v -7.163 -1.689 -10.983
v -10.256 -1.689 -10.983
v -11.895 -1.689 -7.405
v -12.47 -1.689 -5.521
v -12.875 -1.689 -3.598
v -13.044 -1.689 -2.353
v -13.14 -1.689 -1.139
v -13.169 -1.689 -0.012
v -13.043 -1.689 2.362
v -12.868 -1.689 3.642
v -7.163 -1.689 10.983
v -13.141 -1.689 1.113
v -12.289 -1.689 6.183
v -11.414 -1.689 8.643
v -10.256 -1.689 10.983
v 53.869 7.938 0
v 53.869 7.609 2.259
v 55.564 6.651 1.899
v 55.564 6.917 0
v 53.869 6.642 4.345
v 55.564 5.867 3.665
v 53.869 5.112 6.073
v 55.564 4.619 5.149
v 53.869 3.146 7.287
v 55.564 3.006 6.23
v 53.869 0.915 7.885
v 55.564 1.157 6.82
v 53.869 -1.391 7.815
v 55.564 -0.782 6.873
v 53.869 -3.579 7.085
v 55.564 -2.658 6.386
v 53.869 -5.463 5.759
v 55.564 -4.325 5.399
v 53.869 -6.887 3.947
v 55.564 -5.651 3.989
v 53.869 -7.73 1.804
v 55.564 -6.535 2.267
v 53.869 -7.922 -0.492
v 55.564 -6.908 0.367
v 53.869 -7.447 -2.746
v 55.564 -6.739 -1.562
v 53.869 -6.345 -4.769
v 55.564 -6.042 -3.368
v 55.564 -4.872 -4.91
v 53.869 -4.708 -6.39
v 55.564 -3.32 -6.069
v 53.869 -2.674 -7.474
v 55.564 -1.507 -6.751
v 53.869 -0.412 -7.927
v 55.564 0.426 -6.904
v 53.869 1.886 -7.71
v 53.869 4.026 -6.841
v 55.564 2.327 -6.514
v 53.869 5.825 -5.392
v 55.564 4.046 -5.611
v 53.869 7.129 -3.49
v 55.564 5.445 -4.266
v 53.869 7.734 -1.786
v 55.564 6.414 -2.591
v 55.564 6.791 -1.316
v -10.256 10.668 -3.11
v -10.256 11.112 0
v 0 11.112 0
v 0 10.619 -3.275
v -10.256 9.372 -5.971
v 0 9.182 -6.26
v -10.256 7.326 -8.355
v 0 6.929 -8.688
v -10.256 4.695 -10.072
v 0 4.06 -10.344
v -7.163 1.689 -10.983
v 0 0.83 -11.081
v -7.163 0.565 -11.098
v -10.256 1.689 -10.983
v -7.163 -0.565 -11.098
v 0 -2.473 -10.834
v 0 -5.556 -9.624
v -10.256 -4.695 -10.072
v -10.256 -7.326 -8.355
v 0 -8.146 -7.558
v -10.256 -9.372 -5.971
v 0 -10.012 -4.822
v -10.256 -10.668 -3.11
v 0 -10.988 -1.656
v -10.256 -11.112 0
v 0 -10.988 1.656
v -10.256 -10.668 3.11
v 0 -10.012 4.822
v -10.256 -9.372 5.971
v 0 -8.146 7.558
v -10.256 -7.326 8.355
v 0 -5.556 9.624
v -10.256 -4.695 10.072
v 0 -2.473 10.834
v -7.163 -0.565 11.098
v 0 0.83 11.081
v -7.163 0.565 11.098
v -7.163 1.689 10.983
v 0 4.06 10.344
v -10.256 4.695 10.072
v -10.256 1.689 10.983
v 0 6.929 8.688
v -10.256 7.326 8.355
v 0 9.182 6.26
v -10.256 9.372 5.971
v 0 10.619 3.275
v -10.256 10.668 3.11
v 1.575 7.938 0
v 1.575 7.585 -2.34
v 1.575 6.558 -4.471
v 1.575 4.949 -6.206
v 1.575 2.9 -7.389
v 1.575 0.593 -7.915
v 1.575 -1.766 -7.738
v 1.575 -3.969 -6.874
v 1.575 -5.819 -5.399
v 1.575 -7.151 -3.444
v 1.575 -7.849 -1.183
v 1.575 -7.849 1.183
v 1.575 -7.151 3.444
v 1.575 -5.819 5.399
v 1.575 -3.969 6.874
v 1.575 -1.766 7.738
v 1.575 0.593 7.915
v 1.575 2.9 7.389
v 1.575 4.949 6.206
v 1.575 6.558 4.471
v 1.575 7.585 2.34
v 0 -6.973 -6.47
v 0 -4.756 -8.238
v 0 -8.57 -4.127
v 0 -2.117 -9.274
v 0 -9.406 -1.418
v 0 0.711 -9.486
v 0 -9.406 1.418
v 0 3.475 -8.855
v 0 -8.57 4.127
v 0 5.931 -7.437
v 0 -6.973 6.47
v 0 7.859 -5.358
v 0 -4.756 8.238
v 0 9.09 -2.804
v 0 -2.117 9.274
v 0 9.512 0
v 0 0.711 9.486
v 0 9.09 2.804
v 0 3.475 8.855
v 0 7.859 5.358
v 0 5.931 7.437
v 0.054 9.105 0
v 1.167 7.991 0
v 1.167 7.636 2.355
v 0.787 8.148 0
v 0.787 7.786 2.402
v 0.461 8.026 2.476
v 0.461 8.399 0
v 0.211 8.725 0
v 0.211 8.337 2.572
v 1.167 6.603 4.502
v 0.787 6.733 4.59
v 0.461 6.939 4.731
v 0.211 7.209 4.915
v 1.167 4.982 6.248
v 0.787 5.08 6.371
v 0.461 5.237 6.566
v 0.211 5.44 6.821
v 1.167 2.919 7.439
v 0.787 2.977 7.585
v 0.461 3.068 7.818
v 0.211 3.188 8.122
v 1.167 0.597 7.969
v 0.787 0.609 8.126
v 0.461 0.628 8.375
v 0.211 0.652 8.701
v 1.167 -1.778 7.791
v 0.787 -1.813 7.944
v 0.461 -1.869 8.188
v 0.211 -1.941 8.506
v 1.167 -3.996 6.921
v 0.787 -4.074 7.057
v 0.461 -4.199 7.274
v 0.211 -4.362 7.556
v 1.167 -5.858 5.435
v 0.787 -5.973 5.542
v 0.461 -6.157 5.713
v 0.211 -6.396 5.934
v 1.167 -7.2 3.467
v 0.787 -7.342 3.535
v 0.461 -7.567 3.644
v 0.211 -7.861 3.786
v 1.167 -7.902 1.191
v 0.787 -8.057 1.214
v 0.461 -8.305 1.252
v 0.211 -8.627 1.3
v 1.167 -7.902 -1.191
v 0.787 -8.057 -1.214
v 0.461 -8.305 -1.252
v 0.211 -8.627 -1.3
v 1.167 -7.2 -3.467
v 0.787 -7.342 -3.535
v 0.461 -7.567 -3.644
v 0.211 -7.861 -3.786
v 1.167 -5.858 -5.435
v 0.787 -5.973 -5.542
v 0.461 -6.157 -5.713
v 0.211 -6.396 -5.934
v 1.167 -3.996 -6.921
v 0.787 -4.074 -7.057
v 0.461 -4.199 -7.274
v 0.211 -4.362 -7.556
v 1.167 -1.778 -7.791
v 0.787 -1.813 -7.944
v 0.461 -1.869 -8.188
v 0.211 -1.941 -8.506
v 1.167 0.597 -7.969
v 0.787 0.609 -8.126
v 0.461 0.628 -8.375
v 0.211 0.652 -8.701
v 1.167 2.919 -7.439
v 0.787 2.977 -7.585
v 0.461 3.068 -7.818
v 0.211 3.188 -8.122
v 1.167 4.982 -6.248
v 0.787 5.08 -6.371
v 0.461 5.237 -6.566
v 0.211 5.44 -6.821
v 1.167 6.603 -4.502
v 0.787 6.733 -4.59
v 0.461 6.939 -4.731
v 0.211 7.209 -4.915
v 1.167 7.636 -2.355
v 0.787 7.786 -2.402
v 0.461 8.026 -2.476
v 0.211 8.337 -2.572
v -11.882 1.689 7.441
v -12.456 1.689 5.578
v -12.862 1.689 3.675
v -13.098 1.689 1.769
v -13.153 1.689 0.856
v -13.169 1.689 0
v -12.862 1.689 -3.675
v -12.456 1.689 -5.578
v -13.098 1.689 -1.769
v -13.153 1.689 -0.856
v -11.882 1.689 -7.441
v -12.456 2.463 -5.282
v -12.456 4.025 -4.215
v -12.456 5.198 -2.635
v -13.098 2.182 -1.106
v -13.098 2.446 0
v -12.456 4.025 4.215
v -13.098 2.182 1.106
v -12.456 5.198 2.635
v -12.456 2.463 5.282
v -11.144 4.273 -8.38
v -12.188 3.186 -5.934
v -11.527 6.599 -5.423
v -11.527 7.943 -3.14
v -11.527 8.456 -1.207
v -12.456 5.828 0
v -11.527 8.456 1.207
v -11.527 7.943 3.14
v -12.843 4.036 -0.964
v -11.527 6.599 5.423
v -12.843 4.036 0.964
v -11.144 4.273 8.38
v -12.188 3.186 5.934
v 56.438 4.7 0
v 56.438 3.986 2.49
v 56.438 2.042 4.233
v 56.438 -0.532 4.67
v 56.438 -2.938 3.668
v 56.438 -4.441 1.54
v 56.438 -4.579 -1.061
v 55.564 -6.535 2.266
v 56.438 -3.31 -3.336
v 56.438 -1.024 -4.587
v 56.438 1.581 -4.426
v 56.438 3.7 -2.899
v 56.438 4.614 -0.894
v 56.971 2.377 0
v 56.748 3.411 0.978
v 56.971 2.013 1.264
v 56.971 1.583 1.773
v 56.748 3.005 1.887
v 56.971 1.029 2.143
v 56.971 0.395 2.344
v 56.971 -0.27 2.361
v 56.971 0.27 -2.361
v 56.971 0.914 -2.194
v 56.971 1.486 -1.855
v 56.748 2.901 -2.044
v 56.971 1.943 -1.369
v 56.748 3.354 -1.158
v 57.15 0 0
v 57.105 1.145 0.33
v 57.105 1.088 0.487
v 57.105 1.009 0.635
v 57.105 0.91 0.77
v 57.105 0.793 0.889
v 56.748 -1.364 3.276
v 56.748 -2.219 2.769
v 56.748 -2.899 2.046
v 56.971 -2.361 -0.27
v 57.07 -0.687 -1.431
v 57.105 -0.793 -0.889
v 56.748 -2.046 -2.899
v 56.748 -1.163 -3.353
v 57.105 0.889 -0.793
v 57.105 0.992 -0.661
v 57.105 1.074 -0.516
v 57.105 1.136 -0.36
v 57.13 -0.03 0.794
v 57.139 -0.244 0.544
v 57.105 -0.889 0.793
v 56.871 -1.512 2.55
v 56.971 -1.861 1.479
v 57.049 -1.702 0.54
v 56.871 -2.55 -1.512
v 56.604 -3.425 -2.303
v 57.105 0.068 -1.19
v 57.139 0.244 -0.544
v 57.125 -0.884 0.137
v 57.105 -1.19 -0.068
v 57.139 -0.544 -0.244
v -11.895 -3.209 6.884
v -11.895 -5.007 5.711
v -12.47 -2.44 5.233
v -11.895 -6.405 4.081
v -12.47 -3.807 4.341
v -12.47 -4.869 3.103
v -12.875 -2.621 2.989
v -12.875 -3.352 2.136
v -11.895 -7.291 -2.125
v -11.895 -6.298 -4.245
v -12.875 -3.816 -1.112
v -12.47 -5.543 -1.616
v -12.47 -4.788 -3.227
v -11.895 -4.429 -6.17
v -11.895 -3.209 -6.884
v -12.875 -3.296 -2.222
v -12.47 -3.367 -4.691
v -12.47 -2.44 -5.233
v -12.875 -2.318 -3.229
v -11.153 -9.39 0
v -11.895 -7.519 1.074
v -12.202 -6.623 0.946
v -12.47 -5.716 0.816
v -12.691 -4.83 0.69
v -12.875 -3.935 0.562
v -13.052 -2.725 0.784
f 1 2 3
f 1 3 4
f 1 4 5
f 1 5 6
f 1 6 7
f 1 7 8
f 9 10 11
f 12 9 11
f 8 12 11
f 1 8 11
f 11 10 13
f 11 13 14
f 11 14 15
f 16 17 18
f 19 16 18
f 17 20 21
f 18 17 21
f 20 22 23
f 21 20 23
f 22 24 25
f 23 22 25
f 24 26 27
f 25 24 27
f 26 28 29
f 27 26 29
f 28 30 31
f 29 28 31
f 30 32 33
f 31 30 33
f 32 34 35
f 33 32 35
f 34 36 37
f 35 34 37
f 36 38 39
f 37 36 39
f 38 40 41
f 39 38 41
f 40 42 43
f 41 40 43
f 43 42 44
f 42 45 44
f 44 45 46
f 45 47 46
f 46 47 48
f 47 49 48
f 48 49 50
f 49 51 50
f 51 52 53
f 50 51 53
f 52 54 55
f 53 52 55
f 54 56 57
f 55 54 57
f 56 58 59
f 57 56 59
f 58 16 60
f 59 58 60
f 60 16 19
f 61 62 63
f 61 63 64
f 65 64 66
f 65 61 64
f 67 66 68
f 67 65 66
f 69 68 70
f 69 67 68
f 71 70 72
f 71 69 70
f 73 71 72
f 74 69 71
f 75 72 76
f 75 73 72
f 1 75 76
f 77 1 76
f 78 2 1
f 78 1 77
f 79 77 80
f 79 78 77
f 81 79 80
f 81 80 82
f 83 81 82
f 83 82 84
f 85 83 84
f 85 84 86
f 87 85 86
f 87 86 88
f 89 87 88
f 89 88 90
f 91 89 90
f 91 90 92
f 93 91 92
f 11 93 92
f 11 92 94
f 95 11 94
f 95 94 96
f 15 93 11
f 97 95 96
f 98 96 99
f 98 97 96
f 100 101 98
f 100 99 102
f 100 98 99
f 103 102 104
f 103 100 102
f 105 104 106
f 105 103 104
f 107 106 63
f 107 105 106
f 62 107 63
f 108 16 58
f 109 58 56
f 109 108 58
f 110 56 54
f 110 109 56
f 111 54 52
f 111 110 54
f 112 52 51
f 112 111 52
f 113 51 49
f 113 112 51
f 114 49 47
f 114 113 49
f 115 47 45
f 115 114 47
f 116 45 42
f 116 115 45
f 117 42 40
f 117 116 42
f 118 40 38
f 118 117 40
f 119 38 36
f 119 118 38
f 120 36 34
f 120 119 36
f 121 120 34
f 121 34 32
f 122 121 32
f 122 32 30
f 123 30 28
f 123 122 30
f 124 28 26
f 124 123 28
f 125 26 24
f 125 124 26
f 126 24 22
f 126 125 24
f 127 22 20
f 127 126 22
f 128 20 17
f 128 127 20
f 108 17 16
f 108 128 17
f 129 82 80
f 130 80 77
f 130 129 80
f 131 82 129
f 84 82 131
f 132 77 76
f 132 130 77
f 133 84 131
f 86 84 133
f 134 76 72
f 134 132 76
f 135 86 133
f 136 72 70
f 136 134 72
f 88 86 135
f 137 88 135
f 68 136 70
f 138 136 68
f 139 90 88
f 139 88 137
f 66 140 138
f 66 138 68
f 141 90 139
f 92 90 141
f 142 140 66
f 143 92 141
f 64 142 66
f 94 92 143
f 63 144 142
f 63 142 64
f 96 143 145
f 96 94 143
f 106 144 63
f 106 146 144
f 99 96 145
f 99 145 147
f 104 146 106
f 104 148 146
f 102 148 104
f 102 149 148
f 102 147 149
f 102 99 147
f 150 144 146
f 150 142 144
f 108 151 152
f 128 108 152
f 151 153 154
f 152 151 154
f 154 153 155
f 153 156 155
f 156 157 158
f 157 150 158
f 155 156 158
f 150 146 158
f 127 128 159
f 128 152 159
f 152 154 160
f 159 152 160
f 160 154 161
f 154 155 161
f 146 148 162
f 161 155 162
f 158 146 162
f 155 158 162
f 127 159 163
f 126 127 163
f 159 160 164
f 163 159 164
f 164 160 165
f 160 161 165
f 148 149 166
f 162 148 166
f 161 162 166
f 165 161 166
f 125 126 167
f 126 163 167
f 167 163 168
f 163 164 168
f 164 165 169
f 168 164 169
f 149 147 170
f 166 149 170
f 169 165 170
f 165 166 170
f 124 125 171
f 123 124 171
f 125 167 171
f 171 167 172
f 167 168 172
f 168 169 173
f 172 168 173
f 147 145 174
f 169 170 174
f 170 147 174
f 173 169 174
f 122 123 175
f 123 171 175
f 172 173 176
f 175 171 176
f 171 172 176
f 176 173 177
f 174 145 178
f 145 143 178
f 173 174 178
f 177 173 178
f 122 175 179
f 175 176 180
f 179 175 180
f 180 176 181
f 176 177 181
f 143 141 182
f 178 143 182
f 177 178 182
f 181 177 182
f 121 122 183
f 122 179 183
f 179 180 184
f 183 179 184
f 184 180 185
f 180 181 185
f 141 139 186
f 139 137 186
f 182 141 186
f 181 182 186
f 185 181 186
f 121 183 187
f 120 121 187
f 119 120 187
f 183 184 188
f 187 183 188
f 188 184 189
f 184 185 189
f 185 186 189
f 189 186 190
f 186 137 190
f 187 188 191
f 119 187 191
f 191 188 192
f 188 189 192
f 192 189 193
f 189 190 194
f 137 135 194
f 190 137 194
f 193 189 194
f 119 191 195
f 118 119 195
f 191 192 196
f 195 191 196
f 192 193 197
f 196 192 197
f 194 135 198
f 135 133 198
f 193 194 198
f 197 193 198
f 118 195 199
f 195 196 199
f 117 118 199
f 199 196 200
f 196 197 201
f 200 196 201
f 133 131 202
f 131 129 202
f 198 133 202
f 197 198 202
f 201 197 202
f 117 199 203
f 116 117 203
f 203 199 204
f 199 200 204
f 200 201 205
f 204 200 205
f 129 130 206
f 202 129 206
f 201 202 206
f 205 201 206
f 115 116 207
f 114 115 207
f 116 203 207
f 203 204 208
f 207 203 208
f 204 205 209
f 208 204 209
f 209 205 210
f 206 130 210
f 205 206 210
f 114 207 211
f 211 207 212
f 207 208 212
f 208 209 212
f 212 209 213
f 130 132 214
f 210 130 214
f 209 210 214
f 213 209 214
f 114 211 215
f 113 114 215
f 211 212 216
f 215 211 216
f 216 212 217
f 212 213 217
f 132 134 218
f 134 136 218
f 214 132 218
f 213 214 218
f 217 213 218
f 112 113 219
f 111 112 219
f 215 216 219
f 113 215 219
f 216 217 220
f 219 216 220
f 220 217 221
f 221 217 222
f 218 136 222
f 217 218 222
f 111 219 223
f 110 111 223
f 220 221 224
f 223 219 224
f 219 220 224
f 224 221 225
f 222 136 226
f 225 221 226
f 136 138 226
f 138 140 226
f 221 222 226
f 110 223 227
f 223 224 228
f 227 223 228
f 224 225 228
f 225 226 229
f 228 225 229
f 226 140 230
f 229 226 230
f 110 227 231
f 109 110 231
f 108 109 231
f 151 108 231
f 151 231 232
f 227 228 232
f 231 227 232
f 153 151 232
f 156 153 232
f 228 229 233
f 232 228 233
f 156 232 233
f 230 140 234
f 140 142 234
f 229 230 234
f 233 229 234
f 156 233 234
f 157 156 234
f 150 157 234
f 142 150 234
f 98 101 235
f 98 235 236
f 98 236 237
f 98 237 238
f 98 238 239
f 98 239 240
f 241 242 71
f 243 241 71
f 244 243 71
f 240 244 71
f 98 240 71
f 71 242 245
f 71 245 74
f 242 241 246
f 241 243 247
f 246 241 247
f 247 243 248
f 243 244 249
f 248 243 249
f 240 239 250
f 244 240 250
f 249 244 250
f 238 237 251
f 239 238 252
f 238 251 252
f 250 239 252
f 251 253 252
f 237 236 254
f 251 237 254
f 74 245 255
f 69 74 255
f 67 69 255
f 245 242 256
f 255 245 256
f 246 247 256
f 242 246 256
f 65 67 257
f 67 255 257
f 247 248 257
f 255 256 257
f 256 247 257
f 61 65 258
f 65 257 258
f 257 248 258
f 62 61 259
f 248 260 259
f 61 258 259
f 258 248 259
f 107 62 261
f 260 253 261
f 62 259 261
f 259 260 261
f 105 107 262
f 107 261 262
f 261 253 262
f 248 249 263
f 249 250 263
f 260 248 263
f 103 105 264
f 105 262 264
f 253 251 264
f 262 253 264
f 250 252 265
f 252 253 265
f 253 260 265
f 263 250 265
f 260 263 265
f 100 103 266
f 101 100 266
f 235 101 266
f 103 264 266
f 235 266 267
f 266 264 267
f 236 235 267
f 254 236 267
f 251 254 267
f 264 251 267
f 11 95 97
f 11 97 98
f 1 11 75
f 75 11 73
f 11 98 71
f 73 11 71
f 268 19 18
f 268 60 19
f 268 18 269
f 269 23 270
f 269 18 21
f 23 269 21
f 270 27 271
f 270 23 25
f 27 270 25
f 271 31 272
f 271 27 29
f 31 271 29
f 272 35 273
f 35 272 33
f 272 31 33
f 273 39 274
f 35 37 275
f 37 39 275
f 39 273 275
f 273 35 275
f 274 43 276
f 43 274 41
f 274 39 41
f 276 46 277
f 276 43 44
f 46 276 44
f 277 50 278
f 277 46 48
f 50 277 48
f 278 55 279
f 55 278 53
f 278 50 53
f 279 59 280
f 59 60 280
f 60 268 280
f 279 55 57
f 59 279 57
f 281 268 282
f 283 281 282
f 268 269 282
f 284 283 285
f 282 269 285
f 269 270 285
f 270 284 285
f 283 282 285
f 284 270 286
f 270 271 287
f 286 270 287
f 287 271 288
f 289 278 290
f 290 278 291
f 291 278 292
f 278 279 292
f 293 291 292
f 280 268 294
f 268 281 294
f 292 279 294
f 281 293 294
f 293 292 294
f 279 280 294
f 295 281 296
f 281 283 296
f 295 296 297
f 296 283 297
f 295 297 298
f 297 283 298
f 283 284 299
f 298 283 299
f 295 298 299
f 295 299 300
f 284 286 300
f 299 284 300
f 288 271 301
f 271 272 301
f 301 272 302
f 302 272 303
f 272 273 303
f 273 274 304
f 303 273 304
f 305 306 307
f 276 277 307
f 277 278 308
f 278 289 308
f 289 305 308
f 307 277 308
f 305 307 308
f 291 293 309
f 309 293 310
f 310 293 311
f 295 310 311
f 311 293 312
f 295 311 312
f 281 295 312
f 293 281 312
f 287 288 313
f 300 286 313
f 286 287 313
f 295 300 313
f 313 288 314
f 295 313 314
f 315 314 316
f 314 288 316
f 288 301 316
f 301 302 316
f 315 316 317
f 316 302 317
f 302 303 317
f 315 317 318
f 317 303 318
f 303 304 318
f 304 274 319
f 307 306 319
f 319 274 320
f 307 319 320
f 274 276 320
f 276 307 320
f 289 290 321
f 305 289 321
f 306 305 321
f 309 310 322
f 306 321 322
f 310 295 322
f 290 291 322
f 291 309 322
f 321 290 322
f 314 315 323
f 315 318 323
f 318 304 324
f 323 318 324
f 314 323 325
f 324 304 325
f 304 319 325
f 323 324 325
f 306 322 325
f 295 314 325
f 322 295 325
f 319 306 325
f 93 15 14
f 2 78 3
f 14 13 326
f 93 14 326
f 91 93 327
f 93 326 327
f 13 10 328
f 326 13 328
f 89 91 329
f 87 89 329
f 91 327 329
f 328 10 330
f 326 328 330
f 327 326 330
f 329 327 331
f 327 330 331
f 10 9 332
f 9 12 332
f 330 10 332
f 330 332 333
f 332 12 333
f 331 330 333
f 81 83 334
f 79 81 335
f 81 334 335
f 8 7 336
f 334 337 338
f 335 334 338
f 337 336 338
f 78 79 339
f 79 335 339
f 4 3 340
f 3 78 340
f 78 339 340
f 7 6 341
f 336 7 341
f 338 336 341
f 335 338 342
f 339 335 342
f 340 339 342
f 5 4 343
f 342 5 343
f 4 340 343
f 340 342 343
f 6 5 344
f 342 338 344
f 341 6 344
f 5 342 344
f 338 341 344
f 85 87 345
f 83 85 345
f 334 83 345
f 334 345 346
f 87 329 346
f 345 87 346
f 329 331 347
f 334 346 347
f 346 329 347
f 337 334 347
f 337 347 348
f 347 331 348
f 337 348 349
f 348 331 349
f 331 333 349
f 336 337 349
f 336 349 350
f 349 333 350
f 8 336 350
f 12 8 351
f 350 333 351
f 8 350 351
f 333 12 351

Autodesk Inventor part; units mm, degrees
ref_plane "YZ Plane" through (0, 0, 0) normal (1, 0, 0) x (0, 1, 0)
sketch "Sketch1" plane through (0, 0, 0) normal (0, 0, 1) x (1, 0, 0)
  line L0 (-13.2334, 0) -> (57.15, 0)
  line L1 (57.15, 0) -> (57.15, 7.9375)
  line L2 (57.15, 7.9375) -> (19.05, 7.9375)
  line L3 (19.05, 7.9375) -> (17.6644, 7.9375)
  line L4 (17.6644, 7.9375) -> (0, 7.9375)
  line L5 (0, 7.9375) -> (0, 11.1125)
  line L6 (-28.1879, 0) -> (71.373, 0) projected
  line L7 (0, -2.2617) -> (0, 13.5702) projected
  line L8 (0, 11.1125) -> (-10.2558, 11.1125)
  arc A0 (-10.2558, 11.1125) -> (-13.2334, 0) centre (8.9916, 0) ccw
  line L9 (19.05, 7.9375) -> (0, 7.9375) construction
  dimension "d0" = 57.15
  dimension "d1" = 38.1
  dimension "d2" = 1.3856
  dimension "d3" = 13.2334
  dimension "d4" = 15.875
  dimension "d5" = 15.875
  dimension "d9" = 22.225
  dimension "d10" = 0
  dimension "d13" = 22.225
revolve "Body" add sketch "Sketch1" angle 360 about axis through (-13.2334, 0, 0) along (1, 0, 0)
ref_plane "IDS_WORKPLANE{1}" through (-13.2334, 0, 0) normal (1, 0, 0) x (0, 0, -1)
sketch "Sketch2" plane through (-13.2334, 0, 0) normal (1, 0, 0) x (0, 0, -1)
  circle A0 centre (0, 0) radius 11.1125 projected
  line L0 (0, -15.5575) -> (0, 15.5575) projected
  line L1 (15.5575, 0) -> (-15.5575, 0) projected
  line L2 (-11.1125, 1.6891) -> (11.1125, 1.6891)
  line L3 (11.1125, 1.6891) -> (11.1125, -1.6891)
  line L4 (11.1125, -1.6891) -> (-11.1125, -1.6891)
  line L5 (-11.1125, -1.6891) -> (-11.1125, 1.6891)
  line L6 (-11.1125, 0) -> (11.1125, 0) construction
  line L7 (0, 1.6891) -> (0, -1.6891) construction
  dimension "d15" = 3.3782
extrude "Slot" cut sketch "Sketch2" along normal blind 6.0706 contours L1 L0 L2 A0 | L3 L4 A0 | A0 L4 L0 L1 | A0 L2 L3 | L1 A0 L2 L0 | L0 L4 A0 L1 | L5 L2 A0 | A0 L4 L5
thread "Thread" size "5/8-11 UNC" class "2A" standard "ANSI Unified Screw Threads" length 38.1
sketch "Sketch3" plane through (0, 0, 0) normal (0, 0, 1) x (1, 0, 0)
  line L0 (57.15, 0) -> (57.15, 7.9375) projected
  line L1 (57.15, 7.9375) -> (19.05, 7.9375) projected
  line L2 (-13.2334, 0) -> (57.15, 0) projected
  arc A0 (57.15, 0) -> (55.0232, 7.9375) centre (41.275, 0) ccw
  line L3 (57.15, -7.9375) -> (57.15, 7.9375) projected
  line L4 (55.0232, 7.9375) -> (55.0232, 0)
  line L5 (55.0232, 0) -> (57.15, 0)
  dimension "d40" = 15.875
revolve "Fillet1" cut sketch "Sketch3" angle 360 about axis through (-13.2334, 0, 0) along (1, 0, 0) contours A0 L1 L0
chamfer "Chamfer" distance 1.1545 angle 45 1 edges at (55.0232, -7.9375, 0)
ref_plane "Work Plane2" through (41.275, 0, 0) normal (0, 0, -1) x (1, 0, 0)
fillet "Fillet4" radius 1.5748 1 edges at (0, -7.9375, 0)
equation "\"d0\" = NLG"
equation "\"d1\" = GEL"
equation "\"d2\" = GAL"
equation "\"d3\" = KOH"
equation "\"d4\" = GD"
equation "\"d5\" = BDM"
equation "\"d9\" = KOD"
equation "\"d13\" = KR"
equation "\"d15\" = SBR"
equation "\"d16\" = STI"
equation "\"d40\" = GD"
equation "\"d46\" = R"
equation "\"d11\" = GEL"
equation "\"d43\" = 0.5 * RR"
equation "\"GD\" = NND"
equation "\"NLG\" = 57.15"
equation "\"GEL\" = 38.1"
equation "\"KOD\" = 22.225"
equation "\"KOH\" = 13.2334"
equation "\"GAL\" = 1.38557"
equation "\"BDM\" = NND"
equation "\"SBR\" = 3.3782"
equation "\"STI\" = 6.0706"
equation "\"KEWI\" = 0"
equation "\"KR\" = KOD"
equation "\"d14\" = -KOH"
equation "\"R\" = 1.5748"
equation "\"THREADDIA\" = 15.875"
equation "\"TOA\" = 30deg"
equation "\"KOH1\" = 10.7188"
equation "\"NND\" = 15.875"
equation "\"GD1\" = 13.12672"
equation "\"THREADDESC\" = 1.2345"
equation "\"RR\" = 2.309091"
properties part number "ANSI B18.6.2 - 5/8-11 UNC - 2.25, SFHCSI" material "Steel, Mild"
